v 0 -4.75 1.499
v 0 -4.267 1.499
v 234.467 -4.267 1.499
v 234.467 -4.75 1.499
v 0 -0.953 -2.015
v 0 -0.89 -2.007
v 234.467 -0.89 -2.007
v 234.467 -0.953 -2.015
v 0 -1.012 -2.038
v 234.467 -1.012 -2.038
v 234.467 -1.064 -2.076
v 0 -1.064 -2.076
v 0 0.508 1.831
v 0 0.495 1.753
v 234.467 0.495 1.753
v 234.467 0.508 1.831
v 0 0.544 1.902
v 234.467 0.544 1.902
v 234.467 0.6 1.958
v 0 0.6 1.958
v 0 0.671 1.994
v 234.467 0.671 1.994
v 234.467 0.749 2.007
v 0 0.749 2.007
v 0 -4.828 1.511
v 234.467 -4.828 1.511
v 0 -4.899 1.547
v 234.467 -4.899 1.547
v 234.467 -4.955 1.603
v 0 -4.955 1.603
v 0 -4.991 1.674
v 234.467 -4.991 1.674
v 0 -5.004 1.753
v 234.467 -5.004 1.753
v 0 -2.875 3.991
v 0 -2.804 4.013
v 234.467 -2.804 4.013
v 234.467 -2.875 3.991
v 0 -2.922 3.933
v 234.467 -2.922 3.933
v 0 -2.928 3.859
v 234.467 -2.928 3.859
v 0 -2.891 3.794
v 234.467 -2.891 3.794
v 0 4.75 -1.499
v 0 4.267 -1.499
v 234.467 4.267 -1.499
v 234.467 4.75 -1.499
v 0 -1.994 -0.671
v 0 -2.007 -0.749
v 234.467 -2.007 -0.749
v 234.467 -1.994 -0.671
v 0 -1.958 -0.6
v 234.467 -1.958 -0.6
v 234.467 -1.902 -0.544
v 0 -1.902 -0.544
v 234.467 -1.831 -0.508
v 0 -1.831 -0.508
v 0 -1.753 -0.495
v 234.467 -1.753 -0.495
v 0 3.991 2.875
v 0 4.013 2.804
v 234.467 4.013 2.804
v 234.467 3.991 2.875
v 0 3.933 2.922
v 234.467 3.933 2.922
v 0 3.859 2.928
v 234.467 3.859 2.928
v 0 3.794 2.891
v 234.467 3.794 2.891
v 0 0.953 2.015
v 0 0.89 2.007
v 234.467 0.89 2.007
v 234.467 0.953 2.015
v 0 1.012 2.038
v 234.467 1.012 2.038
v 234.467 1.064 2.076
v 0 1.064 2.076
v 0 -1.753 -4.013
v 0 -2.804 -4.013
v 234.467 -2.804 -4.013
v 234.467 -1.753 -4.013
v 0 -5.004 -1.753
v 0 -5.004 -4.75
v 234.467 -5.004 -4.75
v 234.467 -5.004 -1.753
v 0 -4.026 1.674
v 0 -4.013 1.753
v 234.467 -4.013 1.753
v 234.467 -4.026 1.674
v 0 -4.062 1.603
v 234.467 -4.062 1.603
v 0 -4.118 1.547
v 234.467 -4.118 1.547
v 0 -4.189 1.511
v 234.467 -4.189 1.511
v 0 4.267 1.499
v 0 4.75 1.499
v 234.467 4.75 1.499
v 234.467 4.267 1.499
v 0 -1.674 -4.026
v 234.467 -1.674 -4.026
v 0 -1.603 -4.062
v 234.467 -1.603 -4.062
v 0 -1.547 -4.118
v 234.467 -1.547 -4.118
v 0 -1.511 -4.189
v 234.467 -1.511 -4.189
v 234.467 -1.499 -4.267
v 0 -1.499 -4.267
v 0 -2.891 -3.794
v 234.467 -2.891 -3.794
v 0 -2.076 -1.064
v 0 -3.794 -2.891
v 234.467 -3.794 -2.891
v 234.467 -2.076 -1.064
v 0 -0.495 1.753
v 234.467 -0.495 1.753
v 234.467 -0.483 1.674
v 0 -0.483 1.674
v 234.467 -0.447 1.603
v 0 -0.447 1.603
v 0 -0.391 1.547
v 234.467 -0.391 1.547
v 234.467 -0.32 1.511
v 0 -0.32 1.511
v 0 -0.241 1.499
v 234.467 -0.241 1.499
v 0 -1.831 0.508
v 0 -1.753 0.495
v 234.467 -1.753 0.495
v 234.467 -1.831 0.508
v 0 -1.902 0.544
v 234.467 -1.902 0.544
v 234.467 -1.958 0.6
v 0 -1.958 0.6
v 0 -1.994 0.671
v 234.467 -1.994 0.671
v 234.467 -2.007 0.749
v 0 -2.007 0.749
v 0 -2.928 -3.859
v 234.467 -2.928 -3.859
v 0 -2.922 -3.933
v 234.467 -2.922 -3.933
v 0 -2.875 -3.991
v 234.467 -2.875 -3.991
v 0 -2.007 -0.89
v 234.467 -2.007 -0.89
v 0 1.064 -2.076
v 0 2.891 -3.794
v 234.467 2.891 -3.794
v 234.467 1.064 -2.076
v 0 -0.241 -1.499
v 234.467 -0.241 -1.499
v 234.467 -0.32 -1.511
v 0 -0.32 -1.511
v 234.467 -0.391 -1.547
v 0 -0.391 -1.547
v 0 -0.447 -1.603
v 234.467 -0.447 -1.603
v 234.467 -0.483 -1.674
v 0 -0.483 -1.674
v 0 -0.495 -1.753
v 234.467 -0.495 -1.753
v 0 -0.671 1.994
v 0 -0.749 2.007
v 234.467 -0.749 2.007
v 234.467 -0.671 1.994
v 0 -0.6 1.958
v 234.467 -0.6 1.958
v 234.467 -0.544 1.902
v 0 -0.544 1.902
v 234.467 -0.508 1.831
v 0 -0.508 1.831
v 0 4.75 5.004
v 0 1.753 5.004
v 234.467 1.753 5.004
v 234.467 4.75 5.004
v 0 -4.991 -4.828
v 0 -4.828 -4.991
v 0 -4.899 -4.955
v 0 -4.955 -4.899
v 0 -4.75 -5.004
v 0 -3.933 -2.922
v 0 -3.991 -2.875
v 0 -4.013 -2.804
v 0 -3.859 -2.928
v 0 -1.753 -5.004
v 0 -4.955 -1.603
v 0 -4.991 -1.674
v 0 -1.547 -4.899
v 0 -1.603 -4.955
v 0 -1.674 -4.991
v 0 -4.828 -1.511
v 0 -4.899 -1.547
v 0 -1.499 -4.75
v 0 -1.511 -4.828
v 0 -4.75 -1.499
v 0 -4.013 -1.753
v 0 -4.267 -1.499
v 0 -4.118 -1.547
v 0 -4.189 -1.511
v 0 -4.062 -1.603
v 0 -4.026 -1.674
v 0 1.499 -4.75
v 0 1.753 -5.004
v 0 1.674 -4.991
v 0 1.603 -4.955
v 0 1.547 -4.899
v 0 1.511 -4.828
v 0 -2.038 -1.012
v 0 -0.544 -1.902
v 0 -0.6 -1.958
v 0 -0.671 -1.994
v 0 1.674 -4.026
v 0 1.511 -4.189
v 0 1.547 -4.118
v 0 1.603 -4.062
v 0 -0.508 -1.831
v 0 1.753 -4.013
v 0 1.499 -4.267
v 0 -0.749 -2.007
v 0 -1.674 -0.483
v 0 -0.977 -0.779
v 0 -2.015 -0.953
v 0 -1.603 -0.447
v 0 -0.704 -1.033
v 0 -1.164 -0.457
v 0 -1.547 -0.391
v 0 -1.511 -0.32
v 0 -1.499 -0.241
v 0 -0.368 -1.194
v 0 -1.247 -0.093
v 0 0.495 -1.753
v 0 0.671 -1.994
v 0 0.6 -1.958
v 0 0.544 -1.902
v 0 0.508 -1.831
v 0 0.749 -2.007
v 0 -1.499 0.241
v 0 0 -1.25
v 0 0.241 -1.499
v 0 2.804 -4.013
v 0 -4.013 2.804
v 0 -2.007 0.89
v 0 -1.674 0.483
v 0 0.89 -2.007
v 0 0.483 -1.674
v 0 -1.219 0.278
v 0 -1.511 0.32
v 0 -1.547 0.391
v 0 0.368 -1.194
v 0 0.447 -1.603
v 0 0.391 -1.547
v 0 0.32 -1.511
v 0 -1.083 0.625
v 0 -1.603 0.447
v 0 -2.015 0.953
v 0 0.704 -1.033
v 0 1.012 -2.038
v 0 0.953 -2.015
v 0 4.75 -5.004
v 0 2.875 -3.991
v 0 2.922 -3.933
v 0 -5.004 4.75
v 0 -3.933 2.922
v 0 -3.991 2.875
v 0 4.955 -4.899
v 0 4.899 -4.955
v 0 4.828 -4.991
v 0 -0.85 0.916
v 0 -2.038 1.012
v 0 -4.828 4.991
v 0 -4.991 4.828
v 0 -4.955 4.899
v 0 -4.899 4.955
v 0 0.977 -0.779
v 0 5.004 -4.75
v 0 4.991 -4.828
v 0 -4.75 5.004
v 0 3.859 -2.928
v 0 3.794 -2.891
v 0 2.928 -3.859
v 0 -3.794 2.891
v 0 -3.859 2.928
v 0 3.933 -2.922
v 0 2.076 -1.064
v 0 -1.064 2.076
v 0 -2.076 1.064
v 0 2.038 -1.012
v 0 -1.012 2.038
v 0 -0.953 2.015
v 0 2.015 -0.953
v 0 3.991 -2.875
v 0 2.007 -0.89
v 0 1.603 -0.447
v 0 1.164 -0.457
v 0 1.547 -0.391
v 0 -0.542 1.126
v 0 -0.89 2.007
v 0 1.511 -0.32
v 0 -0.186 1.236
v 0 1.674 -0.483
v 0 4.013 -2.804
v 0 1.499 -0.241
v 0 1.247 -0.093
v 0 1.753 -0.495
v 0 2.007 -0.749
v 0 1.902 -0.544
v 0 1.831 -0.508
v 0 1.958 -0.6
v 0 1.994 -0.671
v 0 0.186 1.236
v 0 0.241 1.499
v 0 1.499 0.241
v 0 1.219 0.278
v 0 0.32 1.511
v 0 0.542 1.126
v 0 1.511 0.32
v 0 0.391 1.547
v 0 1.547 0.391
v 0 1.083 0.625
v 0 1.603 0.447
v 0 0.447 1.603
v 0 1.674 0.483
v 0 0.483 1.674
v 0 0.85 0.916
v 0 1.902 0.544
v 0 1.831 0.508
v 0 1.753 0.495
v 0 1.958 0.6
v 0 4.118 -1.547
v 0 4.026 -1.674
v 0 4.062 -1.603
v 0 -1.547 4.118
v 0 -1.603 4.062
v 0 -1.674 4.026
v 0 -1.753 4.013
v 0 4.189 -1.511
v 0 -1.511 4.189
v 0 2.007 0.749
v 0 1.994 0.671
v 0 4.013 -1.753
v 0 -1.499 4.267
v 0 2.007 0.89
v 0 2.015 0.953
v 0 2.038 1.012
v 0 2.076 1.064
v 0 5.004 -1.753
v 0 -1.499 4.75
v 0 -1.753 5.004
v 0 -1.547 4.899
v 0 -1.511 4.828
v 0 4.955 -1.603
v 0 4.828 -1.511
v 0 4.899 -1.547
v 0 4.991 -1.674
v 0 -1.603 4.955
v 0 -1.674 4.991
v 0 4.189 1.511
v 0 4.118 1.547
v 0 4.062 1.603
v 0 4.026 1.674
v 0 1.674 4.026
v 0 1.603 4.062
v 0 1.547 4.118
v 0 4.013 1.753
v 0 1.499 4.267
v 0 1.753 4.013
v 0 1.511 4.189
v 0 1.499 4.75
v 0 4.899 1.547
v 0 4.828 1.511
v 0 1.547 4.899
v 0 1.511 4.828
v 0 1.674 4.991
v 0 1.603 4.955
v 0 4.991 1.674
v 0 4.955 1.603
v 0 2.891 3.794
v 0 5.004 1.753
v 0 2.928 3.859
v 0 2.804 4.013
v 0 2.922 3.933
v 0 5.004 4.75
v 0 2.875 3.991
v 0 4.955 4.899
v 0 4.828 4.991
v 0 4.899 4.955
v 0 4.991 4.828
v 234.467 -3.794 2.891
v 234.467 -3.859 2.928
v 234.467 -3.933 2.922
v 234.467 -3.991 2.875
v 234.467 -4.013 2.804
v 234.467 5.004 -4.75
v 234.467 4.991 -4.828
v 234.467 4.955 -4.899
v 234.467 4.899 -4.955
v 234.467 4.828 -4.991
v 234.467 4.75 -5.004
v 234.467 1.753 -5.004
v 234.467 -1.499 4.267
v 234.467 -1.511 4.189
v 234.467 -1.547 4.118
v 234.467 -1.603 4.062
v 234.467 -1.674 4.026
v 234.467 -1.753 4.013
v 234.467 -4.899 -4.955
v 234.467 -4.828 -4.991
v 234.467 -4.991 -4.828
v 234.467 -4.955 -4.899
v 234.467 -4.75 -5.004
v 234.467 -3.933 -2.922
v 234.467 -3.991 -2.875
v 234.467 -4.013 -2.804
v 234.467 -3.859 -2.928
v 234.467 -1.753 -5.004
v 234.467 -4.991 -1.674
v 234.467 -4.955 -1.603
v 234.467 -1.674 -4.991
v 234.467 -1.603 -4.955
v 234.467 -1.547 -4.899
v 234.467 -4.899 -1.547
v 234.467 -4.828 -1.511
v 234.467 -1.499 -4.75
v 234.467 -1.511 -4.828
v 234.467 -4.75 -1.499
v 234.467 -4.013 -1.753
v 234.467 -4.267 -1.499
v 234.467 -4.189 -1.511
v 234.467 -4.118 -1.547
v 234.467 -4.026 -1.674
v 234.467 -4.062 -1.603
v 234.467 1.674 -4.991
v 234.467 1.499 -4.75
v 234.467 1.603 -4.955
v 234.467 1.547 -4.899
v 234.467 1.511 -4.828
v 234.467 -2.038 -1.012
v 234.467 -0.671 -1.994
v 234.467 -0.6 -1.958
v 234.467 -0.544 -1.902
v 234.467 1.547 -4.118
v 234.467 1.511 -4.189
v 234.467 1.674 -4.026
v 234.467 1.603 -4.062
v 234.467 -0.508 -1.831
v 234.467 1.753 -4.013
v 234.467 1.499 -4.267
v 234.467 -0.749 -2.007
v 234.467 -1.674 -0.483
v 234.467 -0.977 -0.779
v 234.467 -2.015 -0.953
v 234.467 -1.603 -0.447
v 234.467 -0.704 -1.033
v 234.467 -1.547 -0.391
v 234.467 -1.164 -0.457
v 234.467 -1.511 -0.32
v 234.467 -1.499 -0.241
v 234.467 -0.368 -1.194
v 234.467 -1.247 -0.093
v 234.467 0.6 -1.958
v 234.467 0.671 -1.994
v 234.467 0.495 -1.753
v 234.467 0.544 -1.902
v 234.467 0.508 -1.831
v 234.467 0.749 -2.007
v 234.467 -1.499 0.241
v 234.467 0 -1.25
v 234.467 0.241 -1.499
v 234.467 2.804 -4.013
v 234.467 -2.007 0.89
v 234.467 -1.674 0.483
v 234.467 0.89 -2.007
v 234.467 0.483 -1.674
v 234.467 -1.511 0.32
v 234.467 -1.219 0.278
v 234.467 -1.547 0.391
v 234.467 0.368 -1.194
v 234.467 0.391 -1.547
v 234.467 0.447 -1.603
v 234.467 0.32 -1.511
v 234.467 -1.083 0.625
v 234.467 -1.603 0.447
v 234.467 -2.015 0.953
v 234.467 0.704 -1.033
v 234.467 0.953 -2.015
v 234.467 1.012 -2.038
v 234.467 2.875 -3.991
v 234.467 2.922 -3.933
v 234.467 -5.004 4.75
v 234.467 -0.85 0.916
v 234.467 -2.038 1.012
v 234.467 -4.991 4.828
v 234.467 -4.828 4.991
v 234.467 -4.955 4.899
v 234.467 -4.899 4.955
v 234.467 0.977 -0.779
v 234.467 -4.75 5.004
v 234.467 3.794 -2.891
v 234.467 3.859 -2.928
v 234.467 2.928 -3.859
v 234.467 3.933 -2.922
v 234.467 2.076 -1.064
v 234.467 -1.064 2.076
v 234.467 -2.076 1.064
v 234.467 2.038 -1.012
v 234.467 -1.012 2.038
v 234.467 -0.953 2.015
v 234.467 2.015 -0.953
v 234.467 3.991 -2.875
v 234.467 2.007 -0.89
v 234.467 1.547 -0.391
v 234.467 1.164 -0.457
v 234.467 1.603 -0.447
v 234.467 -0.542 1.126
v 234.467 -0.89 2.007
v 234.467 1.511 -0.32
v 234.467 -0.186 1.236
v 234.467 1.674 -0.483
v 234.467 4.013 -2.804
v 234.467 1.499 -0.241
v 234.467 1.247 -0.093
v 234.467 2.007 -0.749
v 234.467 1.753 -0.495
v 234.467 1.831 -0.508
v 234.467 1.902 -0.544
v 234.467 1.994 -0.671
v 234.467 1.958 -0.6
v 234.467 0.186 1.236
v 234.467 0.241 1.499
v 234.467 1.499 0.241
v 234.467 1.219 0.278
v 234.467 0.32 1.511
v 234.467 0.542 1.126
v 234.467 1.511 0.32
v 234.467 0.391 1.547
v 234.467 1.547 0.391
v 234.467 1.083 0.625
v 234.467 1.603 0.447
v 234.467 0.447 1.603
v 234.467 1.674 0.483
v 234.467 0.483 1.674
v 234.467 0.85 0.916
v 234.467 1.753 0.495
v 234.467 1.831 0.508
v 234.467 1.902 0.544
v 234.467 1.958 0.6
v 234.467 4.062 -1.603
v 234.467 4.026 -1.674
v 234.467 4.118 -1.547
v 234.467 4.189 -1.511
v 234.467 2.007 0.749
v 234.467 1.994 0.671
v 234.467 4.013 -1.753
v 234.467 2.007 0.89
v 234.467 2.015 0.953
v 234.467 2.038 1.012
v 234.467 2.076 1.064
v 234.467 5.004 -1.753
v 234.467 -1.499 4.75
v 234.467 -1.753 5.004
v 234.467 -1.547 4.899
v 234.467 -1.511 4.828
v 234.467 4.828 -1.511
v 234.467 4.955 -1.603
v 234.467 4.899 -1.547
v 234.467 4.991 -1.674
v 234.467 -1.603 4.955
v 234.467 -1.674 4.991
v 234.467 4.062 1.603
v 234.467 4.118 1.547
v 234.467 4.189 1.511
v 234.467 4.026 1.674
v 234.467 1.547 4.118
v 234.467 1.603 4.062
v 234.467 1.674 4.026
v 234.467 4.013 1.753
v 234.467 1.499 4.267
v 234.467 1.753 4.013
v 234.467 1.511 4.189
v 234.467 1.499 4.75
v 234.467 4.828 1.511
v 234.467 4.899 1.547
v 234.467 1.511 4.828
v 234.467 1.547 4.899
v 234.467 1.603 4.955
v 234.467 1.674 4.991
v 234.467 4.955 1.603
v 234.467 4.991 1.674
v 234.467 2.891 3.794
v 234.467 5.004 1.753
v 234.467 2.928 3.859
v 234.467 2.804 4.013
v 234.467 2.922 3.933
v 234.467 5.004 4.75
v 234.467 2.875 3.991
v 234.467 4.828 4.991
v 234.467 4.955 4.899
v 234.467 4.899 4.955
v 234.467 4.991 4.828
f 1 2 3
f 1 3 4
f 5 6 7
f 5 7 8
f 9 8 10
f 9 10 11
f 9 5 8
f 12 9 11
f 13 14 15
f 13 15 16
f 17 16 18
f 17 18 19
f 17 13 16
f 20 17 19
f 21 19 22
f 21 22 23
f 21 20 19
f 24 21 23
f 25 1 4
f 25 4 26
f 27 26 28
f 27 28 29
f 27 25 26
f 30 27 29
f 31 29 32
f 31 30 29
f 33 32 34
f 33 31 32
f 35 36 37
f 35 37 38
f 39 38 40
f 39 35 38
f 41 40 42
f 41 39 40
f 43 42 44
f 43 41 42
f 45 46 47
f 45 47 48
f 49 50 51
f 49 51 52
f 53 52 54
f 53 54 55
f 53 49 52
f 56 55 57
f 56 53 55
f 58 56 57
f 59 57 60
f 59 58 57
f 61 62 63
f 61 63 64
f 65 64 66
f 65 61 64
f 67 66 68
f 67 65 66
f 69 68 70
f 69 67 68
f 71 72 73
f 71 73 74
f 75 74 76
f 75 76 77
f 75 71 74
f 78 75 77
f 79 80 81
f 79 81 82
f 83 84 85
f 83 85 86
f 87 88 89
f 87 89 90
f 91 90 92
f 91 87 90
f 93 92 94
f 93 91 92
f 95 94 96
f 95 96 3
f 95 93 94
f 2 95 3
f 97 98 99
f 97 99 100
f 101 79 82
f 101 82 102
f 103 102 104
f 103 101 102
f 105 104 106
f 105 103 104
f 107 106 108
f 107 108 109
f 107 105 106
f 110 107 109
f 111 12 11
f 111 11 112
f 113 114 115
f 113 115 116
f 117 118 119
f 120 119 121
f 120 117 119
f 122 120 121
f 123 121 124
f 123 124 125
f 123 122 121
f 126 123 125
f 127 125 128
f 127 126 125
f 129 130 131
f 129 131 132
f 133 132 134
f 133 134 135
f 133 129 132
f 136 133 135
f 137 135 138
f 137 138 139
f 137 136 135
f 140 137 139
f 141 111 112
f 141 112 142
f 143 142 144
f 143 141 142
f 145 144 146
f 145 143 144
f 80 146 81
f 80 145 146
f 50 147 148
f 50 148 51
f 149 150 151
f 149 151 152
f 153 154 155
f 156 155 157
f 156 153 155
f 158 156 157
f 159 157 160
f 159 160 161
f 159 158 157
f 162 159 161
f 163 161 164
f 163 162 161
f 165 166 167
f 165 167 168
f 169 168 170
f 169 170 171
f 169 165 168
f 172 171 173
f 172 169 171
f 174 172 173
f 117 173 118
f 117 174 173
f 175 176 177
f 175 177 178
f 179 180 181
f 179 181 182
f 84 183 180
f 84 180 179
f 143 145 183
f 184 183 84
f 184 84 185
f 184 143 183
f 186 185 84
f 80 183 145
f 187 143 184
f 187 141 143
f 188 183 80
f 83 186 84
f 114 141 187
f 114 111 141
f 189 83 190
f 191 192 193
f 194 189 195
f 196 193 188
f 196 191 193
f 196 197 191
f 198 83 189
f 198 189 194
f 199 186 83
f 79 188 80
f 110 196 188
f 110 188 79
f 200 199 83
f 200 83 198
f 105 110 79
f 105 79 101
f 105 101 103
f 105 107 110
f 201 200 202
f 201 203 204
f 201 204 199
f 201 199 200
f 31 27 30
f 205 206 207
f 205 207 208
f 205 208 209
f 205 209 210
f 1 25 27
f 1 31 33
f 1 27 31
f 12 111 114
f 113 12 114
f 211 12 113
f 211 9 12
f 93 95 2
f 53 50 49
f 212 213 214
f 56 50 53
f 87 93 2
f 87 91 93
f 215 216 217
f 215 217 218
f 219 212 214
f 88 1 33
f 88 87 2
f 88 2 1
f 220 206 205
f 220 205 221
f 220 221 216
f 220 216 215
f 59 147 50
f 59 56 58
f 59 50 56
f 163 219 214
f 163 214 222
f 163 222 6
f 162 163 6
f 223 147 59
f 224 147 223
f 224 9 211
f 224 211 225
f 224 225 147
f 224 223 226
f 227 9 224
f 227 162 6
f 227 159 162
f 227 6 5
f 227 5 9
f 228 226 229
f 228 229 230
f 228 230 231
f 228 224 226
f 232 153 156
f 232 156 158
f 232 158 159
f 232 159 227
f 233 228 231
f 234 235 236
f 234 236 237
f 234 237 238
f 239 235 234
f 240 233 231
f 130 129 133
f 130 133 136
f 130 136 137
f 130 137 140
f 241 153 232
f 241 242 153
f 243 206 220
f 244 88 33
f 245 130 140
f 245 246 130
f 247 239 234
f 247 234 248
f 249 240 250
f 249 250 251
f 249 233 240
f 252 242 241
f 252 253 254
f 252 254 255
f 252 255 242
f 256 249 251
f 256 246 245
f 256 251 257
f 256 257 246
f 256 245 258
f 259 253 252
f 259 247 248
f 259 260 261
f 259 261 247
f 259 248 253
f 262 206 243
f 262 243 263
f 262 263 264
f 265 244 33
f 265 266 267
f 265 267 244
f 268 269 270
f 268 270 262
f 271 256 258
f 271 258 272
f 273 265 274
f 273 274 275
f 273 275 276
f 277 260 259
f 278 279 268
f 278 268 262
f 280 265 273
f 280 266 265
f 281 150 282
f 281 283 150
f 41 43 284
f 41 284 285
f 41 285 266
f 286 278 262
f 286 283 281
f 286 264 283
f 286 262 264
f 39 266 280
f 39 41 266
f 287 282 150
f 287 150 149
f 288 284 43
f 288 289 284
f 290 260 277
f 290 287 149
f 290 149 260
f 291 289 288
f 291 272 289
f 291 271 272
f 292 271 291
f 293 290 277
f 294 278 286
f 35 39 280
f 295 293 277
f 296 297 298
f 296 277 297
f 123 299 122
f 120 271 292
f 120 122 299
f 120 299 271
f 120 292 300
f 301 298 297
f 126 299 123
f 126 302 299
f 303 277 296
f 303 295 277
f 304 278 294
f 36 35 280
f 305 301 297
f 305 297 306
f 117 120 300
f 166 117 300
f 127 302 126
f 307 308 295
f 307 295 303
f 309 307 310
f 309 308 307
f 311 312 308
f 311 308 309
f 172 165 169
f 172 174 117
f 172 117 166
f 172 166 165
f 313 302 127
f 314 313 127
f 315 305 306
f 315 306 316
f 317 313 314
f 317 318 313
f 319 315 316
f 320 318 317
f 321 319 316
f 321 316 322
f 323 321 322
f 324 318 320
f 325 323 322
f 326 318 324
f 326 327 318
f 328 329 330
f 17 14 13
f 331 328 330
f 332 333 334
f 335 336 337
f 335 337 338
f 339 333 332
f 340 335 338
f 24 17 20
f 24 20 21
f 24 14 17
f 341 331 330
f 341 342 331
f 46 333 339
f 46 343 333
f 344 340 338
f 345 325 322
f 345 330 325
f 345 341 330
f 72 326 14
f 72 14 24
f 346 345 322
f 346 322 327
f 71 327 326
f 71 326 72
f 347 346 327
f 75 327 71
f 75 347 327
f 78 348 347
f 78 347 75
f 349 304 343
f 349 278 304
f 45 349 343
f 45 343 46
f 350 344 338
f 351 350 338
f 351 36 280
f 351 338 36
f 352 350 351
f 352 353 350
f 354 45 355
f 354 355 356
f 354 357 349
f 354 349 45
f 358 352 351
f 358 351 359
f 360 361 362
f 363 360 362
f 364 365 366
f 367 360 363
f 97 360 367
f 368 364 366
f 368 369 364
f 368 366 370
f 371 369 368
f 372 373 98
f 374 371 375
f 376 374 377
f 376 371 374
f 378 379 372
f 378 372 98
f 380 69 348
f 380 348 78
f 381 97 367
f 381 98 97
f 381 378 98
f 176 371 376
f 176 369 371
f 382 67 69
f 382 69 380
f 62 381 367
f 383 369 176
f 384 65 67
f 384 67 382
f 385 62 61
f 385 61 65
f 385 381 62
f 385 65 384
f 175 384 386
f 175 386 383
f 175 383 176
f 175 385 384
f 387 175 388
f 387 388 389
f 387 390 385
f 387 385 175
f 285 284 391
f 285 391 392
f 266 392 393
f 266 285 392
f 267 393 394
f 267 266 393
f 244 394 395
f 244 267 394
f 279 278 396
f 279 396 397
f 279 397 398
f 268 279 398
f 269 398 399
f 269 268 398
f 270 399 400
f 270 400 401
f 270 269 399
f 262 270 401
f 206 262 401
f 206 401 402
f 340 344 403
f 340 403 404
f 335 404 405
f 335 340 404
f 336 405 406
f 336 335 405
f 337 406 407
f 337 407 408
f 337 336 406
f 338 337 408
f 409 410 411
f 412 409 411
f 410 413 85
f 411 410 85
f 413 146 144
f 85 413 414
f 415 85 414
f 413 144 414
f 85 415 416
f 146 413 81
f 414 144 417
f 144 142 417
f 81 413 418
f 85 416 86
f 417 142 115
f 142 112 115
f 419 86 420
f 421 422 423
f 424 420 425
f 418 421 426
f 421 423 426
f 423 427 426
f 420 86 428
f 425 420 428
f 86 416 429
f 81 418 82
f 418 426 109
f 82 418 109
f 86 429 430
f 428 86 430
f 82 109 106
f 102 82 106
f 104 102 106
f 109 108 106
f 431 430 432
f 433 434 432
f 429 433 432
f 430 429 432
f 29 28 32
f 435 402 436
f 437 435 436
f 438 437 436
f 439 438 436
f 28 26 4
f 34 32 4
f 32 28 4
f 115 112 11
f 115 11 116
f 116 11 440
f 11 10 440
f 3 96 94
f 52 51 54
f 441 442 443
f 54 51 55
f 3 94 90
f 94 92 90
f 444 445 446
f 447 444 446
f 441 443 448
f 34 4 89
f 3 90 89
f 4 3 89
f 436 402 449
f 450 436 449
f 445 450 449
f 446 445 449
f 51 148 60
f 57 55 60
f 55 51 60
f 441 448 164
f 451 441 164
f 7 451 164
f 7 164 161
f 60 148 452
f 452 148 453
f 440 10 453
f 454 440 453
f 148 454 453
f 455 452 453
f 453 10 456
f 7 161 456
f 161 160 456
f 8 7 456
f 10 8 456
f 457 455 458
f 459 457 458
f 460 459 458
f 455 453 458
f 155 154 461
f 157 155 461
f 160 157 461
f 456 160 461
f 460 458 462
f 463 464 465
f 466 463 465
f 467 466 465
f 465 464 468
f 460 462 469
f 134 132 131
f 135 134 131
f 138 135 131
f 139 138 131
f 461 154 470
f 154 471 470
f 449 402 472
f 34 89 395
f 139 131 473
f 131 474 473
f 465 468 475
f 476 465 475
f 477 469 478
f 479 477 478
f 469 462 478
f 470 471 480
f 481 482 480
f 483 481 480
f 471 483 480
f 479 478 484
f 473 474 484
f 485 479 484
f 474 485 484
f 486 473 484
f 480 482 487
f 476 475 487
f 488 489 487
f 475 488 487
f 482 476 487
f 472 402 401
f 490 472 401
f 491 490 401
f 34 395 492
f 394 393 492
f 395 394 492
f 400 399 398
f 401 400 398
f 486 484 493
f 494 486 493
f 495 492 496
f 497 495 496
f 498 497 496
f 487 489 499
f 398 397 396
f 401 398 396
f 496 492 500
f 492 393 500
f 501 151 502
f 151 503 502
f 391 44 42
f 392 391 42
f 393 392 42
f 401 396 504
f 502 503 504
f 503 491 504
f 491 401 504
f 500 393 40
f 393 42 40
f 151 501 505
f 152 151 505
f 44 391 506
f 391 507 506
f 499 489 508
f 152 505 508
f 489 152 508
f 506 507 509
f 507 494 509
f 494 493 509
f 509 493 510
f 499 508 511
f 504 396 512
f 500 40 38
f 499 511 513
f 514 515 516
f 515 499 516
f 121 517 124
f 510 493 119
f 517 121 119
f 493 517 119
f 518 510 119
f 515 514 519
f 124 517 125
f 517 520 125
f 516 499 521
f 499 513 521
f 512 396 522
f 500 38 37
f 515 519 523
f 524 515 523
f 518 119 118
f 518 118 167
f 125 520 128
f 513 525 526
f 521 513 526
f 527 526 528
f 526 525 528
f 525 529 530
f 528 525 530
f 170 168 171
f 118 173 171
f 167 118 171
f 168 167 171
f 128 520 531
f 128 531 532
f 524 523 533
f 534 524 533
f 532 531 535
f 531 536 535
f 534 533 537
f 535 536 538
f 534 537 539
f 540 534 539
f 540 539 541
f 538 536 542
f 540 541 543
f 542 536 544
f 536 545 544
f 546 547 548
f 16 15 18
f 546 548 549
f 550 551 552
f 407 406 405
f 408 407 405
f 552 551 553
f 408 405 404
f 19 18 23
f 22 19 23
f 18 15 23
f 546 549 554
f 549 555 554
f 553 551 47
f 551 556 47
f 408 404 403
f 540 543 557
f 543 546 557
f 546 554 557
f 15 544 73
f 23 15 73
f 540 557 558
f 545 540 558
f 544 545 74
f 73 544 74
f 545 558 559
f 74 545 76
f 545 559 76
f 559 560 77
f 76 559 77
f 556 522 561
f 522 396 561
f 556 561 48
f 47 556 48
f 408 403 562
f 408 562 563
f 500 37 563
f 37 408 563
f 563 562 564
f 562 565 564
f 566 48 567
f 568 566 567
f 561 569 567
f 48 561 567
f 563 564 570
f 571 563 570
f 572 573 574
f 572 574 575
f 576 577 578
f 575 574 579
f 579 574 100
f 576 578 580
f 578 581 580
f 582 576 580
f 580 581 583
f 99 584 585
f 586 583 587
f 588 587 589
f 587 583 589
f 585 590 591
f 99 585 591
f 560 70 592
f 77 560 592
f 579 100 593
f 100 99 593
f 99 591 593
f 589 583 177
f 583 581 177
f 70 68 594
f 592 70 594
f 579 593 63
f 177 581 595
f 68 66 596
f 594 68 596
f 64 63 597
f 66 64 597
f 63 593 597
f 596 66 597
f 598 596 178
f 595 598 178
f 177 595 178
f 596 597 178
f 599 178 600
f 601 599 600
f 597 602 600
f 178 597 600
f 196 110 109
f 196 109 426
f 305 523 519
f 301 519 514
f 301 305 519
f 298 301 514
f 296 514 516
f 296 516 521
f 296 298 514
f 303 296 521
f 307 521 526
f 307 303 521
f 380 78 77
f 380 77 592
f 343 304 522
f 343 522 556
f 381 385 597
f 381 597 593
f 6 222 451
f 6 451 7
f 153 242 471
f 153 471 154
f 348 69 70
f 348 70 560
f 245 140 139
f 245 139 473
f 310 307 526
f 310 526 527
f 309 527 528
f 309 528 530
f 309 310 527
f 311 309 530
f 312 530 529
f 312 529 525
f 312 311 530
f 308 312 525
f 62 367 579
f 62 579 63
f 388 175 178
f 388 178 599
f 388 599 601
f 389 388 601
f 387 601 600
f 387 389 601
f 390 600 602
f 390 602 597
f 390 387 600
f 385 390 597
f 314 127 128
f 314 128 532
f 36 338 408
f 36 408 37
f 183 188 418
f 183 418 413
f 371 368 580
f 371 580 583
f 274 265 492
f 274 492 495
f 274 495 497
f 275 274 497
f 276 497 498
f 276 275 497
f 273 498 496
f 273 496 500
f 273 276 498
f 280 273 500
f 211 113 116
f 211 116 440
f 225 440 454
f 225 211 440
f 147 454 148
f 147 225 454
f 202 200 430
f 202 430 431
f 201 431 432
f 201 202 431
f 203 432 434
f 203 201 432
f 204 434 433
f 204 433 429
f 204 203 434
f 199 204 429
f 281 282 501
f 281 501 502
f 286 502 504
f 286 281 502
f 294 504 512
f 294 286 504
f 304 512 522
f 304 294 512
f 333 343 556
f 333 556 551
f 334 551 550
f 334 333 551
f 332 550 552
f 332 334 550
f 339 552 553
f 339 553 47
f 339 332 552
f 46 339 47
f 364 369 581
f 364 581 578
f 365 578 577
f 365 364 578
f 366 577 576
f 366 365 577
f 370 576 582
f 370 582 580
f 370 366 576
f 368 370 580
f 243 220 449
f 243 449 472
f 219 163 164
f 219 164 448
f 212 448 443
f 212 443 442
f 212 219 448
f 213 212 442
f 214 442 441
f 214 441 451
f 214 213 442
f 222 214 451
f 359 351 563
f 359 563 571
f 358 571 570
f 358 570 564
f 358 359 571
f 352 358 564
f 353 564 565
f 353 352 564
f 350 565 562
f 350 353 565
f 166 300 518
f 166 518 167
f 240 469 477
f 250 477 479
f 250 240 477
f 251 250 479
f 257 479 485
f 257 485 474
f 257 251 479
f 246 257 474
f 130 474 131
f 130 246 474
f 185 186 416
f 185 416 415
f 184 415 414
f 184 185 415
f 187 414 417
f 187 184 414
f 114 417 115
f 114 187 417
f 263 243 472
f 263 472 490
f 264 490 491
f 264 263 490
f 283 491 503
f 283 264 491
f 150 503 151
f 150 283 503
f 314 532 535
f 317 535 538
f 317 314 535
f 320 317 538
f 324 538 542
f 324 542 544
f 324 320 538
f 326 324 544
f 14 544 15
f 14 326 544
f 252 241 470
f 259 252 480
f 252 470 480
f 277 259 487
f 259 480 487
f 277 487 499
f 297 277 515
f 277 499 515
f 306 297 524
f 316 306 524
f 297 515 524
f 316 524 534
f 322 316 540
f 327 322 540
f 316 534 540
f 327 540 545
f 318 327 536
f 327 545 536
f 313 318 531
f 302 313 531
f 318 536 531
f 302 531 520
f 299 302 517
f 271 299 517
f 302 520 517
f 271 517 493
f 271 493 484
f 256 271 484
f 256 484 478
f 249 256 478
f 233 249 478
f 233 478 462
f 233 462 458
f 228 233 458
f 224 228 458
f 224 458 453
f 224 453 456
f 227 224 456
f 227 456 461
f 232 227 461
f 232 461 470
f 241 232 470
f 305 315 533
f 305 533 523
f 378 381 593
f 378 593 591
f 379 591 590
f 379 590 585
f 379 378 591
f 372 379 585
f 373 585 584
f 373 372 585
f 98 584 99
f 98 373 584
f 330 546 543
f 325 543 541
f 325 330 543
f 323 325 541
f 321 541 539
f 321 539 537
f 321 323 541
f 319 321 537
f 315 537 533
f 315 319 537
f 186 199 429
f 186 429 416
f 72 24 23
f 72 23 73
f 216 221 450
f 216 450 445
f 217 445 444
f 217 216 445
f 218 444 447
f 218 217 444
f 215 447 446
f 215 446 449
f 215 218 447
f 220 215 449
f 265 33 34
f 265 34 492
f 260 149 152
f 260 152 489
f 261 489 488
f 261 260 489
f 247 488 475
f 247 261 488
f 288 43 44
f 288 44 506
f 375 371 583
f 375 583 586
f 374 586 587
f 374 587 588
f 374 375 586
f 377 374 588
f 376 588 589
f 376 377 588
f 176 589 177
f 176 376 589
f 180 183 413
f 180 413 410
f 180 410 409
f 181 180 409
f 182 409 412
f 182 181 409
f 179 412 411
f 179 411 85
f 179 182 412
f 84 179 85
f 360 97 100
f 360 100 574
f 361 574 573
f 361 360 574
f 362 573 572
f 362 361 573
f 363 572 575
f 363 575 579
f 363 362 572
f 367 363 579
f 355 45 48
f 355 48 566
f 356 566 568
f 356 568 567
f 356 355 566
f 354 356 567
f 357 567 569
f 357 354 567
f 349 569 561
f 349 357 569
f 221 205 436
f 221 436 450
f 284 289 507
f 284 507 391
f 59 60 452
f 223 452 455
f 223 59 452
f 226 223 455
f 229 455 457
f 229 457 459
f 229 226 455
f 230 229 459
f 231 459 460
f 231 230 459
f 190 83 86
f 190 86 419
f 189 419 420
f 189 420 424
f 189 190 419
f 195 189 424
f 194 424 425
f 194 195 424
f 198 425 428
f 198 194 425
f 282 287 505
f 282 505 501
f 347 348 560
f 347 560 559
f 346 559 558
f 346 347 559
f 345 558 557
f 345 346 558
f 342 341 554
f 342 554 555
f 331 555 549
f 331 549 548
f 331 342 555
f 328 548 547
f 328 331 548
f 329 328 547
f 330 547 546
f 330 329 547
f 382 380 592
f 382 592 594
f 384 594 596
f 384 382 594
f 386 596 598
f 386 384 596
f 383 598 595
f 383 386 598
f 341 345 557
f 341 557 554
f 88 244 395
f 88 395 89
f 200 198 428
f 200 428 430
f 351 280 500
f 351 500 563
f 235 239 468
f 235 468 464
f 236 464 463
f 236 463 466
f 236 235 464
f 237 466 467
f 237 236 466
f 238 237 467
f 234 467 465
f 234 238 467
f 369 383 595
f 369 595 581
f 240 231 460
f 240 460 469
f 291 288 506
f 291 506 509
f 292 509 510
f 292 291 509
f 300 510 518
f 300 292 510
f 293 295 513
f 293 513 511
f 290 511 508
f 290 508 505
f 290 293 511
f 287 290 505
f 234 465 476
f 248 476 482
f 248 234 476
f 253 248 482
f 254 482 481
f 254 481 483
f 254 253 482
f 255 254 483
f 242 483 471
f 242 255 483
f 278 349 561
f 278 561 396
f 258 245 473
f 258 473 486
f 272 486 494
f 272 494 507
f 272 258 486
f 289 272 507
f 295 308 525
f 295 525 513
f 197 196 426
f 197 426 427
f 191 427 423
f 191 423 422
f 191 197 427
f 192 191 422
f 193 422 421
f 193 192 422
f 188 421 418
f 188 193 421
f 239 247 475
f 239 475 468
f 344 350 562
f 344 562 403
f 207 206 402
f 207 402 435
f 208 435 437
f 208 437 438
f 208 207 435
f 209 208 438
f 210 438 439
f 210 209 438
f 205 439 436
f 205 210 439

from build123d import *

# Parameters (mm, degrees)
ESTRUSIONE_ESTRUSIONE1_DEPTH = 234.4674
FORO_FILETTATO_M3X0_5_1_D    = 2.5


with BuildPart() as part:
    # Sketch1 → Estrusione-Estrusione1 (new body)
    with BuildSketch(Plane(origin=(0, 0, 0), x_dir=(0, 0, -1), z_dir=(1, 0, 0))):
        with BuildLine():
            Line((-0.2413, 1.4986), (0.2413, 1.4986))
            ThreePointArc((0.2413, 1.4986), (0.420905122, 1.572994878), (0.4953, 1.7526))
            ThreePointArc((0.4953, 1.7526), (0.569694878, 1.932205122), (0.7493, 2.0066))
            Line((0.7493, 2.0066), (0.889923986, 2.0066))
            ThreePointArc((0.889923986, 2.0066), (0.983516259, 2.024471886), (1.063937899, 2.075572548))
            Line((1.063937899, 2.075572548), (2.890793, 3.793686274))
            ThreePointArc((2.890793, 3.793686274), (2.921850101, 3.932996137), (2.803786044, 4.0132))
            Line((2.803786044, 4.0132), (1.7526, 4.0132))
            ThreePointArc((1.7526, 4.0132), (1.572994878, 4.087594878), (1.4986, 4.2672))
            Line((1.4986, 4.2672), (1.4986, 4.7498))
            ThreePointArc((1.4986, 4.7498), (1.572994878, 4.929405122), (1.7526, 5.0038))
            Line((1.7526, 5.0038), (4.7498, 5.0038))
            ThreePointArc((4.7498, 5.0038), (4.929405122, 4.929405122), (5.0038, 4.7498))
            Line((5.0038, 4.7498), (5.0038, 1.7526))
            ThreePointArc((5.0038, 1.7526), (4.929405122, 1.572994878), (4.7498, 1.4986))
            Line((4.7498, 1.4986), (4.2672, 1.4986))
            ThreePointArc((4.2672, 1.4986), (4.087594878, 1.572994878), (4.0132, 1.7526))
            Line((4.0132, 1.7526), (4.0132, 2.803786044))
            ThreePointArc((4.0132, 2.803786044), (3.932996137, 2.921850101), (3.793686274, 2.890793))
            Line((3.793686274, 2.890793), (2.075572548, 1.063937899))
            ThreePointArc((2.075572548, 1.063937899), (2.024471886, 0.983516259), (2.0066, 0.889923986))
            Line((2.0066, 0.889923986), (2.0066, 0.7493))
            ThreePointArc((2.0066, 0.7493), (1.932205122, 0.569694878), (1.7526, 0.4953))
            ThreePointArc((1.7526, 0.4953), (1.572994878, 0.420905122), (1.4986, 0.2413))
            Line((1.4986, 0.2413), (1.4986, -0.2413))
            ThreePointArc((1.4986, -0.2413), (1.572994878, -0.420905122), (1.7526, -0.4953))
            ThreePointArc((1.7526, -0.4953), (1.932205122, -0.569694878), (2.0066, -0.7493))
            Line((2.0066, -0.7493), (2.0066, -0.889923986))
            ThreePointArc((2.0066, -0.889923986), (2.024471886, -0.983516259), (2.075572548, -1.063937899))
            Line((2.075572548, -1.063937899), (3.793686274, -2.890793))
            ThreePointArc((3.793686274, -2.890793), (3.932996137, -2.921850101), (4.0132, -2.803786044))
            Line((4.0132, -2.803786044), (4.0132, -1.7526))
            ThreePointArc((4.0132, -1.7526), (4.087594878, -1.572994878), (4.2672, -1.4986))
            Line((4.2672, -1.4986), (4.7498, -1.4986))
            ThreePointArc((4.7498, -1.4986), (4.929405122, -1.572994878), (5.0038, -1.7526))
            Line((5.0038, -1.7526), (5.0038, -4.7498))
            ThreePointArc((5.0038, -4.7498), (4.929405122, -4.929405122), (4.7498, -5.0038))
            Line((4.7498, -5.0038), (1.7526, -5.0038))
            ThreePointArc((1.7526, -5.0038), (1.572994878, -4.929405122), (1.4986, -4.7498))
            Line((1.4986, -4.7498), (1.4986, -4.2672))
            ThreePointArc((1.4986, -4.2672), (1.572994878, -4.087594878), (1.7526, -4.0132))
            Line((1.7526, -4.0132), (2.803786044, -4.0132))
            ThreePointArc((2.803786044, -4.0132), (2.921850101, -3.932996137), (2.890793, -3.793686274))
            Line((2.890793, -3.793686274), (1.063937899, -2.075572548))
            ThreePointArc((1.063937899, -2.075572548), (0.983516259, -2.024471886), (0.889923986, -2.0066))
            Line((0.889923986, -2.0066), (0.7493, -2.0066))
            ThreePointArc((0.7493, -2.0066), (0.569694878, -1.932205122), (0.4953, -1.7526))
            ThreePointArc((0.4953, -1.7526), (0.420905122, -1.572994878), (0.2413, -1.4986))
            Line((0.2413, -1.4986), (-0.2413, -1.4986))
            ThreePointArc((-0.2413, -1.4986), (-0.420905122, -1.572994878), (-0.4953, -1.7526))
            ThreePointArc((-0.4953, -1.7526), (-0.569694878, -1.932205122), (-0.7493, -2.0066))
            Line((-0.7493, -2.0066), (-0.889923986, -2.0066))
            ThreePointArc((-0.889923986, -2.0066), (-0.983516259, -2.024471886), (-1.063937899, -2.075572548))
            Line((-1.063937899, -2.075572548), (-2.890793, -3.793686274))
            ThreePointArc((-2.890793, -3.793686274), (-2.921850101, -3.932996137), (-2.803786044, -4.0132))
            Line((-2.803786044, -4.0132), (-1.7526, -4.0132))
            ThreePointArc((-1.7526, -4.0132), (-1.572994878, -4.087594878), (-1.4986, -4.2672))
            Line((-1.4986, -4.2672), (-1.4986, -4.7498))
            ThreePointArc((-1.4986, -4.7498), (-1.572994878, -4.929405122), (-1.7526, -5.0038))
            Line((-1.7526, -5.0038), (-4.7498, -5.0038))
            ThreePointArc((-4.7498, -5.0038), (-4.929405122, -4.929405122), (-5.0038, -4.7498))
            Line((-5.0038, -4.7498), (-5.0038, -1.7526))
            ThreePointArc((-5.0038, -1.7526), (-4.929405122, -1.572994878), (-4.7498, -1.4986))
            Line((-4.7498, -1.4986), (-4.2672, -1.4986))
            ThreePointArc((-4.2672, -1.4986), (-4.087594878, -1.572994878), (-4.0132, -1.7526))
            Line((-4.0132, -1.7526), (-4.0132, -2.803786044))
            ThreePointArc((-4.0132, -2.803786044), (-3.932996137, -2.921850101), (-3.793686274, -2.890793))
            Line((-3.793686274, -2.890793), (-2.075572548, -1.063937899))
            ThreePointArc((-2.075572548, -1.063937899), (-2.024471886, -0.983516259), (-2.0066, -0.889923986))
            Line((-2.0066, -0.889923986), (-2.0066, -0.7493))
            ThreePointArc((-2.0066, -0.7493), (-1.932205122, -0.569694878), (-1.7526, -0.4953))
            ThreePointArc((-1.7526, -0.4953), (-1.572994878, -0.420905122), (-1.4986, -0.2413))
            Line((-1.4986, -0.2413), (-1.4986, 0.2413))
            ThreePointArc((-1.4986, 0.2413), (-1.572994878, 0.420905122), (-1.7526, 0.4953))
            ThreePointArc((-1.7526, 0.4953), (-1.932205122, 0.569694878), (-2.0066, 0.7493))
            Line((-2.0066, 0.7493), (-2.0066, 0.889923986))
            ThreePointArc((-2.0066, 0.889923986), (-2.024471886, 0.983516259), (-2.075572548, 1.063937899))
            Line((-2.075572548, 1.063937899), (-3.793686274, 2.890793))
            ThreePointArc((-3.793686274, 2.890793), (-3.932996137, 2.921850101), (-4.0132, 2.803786044))
            Line((-4.0132, 2.803786044), (-4.0132, 1.7526))
            ThreePointArc((-4.0132, 1.7526), (-4.087594878, 1.572994878), (-4.2672, 1.4986))
            Line((-4.2672, 1.4986), (-4.7498, 1.4986))
            ThreePointArc((-4.7498, 1.4986), (-4.929405122, 1.572994878), (-5.0038, 1.7526))
            Line((-5.0038, 1.7526), (-5.0038, 4.7498))
            ThreePointArc((-5.0038, 4.7498), (-4.929405122, 4.929405122), (-4.7498, 5.0038))
            Line((-4.7498, 5.0038), (-1.7526, 5.0038))
            ThreePointArc((-1.7526, 5.0038), (-1.572994878, 4.929405122), (-1.4986, 4.7498))
            Line((-1.4986, 4.7498), (-1.4986, 4.2672))
            ThreePointArc((-1.4986, 4.2672), (-1.572994878, 4.087594878), (-1.7526, 4.0132))
            Line((-1.7526, 4.0132), (-2.803786044, 4.0132))
            ThreePointArc((-2.803786044, 4.0132), (-2.921850101, 3.932996137), (-2.890793, 3.793686274))
            Line((-2.890793, 3.793686274), (-1.063937899, 2.075572548))
            ThreePointArc((-1.063937899, 2.075572548), (-0.983516259, 2.024471886), (-0.889923986, 2.0066))
            Line((-0.889923986, 2.0066), (-0.7493, 2.0066))
            ThreePointArc((-0.7493, 2.0066), (-0.569694878, 1.932205122), (-0.4953, 1.7526))
            ThreePointArc((-0.4953, 1.7526), (-0.420905122, 1.572994878), (-0.2413, 1.4986))
        make_face()
    extrude(amount=ESTRUSIONE_ESTRUSIONE1_DEPTH)

    # Foro filettato M3x0.5-1 (through all)
    with Locations(Plane.ZY):
        with Locations((0, 0)):
            Hole(FORO_FILETTATO_M3X0_5_1_D / 2)


solid = part.part
